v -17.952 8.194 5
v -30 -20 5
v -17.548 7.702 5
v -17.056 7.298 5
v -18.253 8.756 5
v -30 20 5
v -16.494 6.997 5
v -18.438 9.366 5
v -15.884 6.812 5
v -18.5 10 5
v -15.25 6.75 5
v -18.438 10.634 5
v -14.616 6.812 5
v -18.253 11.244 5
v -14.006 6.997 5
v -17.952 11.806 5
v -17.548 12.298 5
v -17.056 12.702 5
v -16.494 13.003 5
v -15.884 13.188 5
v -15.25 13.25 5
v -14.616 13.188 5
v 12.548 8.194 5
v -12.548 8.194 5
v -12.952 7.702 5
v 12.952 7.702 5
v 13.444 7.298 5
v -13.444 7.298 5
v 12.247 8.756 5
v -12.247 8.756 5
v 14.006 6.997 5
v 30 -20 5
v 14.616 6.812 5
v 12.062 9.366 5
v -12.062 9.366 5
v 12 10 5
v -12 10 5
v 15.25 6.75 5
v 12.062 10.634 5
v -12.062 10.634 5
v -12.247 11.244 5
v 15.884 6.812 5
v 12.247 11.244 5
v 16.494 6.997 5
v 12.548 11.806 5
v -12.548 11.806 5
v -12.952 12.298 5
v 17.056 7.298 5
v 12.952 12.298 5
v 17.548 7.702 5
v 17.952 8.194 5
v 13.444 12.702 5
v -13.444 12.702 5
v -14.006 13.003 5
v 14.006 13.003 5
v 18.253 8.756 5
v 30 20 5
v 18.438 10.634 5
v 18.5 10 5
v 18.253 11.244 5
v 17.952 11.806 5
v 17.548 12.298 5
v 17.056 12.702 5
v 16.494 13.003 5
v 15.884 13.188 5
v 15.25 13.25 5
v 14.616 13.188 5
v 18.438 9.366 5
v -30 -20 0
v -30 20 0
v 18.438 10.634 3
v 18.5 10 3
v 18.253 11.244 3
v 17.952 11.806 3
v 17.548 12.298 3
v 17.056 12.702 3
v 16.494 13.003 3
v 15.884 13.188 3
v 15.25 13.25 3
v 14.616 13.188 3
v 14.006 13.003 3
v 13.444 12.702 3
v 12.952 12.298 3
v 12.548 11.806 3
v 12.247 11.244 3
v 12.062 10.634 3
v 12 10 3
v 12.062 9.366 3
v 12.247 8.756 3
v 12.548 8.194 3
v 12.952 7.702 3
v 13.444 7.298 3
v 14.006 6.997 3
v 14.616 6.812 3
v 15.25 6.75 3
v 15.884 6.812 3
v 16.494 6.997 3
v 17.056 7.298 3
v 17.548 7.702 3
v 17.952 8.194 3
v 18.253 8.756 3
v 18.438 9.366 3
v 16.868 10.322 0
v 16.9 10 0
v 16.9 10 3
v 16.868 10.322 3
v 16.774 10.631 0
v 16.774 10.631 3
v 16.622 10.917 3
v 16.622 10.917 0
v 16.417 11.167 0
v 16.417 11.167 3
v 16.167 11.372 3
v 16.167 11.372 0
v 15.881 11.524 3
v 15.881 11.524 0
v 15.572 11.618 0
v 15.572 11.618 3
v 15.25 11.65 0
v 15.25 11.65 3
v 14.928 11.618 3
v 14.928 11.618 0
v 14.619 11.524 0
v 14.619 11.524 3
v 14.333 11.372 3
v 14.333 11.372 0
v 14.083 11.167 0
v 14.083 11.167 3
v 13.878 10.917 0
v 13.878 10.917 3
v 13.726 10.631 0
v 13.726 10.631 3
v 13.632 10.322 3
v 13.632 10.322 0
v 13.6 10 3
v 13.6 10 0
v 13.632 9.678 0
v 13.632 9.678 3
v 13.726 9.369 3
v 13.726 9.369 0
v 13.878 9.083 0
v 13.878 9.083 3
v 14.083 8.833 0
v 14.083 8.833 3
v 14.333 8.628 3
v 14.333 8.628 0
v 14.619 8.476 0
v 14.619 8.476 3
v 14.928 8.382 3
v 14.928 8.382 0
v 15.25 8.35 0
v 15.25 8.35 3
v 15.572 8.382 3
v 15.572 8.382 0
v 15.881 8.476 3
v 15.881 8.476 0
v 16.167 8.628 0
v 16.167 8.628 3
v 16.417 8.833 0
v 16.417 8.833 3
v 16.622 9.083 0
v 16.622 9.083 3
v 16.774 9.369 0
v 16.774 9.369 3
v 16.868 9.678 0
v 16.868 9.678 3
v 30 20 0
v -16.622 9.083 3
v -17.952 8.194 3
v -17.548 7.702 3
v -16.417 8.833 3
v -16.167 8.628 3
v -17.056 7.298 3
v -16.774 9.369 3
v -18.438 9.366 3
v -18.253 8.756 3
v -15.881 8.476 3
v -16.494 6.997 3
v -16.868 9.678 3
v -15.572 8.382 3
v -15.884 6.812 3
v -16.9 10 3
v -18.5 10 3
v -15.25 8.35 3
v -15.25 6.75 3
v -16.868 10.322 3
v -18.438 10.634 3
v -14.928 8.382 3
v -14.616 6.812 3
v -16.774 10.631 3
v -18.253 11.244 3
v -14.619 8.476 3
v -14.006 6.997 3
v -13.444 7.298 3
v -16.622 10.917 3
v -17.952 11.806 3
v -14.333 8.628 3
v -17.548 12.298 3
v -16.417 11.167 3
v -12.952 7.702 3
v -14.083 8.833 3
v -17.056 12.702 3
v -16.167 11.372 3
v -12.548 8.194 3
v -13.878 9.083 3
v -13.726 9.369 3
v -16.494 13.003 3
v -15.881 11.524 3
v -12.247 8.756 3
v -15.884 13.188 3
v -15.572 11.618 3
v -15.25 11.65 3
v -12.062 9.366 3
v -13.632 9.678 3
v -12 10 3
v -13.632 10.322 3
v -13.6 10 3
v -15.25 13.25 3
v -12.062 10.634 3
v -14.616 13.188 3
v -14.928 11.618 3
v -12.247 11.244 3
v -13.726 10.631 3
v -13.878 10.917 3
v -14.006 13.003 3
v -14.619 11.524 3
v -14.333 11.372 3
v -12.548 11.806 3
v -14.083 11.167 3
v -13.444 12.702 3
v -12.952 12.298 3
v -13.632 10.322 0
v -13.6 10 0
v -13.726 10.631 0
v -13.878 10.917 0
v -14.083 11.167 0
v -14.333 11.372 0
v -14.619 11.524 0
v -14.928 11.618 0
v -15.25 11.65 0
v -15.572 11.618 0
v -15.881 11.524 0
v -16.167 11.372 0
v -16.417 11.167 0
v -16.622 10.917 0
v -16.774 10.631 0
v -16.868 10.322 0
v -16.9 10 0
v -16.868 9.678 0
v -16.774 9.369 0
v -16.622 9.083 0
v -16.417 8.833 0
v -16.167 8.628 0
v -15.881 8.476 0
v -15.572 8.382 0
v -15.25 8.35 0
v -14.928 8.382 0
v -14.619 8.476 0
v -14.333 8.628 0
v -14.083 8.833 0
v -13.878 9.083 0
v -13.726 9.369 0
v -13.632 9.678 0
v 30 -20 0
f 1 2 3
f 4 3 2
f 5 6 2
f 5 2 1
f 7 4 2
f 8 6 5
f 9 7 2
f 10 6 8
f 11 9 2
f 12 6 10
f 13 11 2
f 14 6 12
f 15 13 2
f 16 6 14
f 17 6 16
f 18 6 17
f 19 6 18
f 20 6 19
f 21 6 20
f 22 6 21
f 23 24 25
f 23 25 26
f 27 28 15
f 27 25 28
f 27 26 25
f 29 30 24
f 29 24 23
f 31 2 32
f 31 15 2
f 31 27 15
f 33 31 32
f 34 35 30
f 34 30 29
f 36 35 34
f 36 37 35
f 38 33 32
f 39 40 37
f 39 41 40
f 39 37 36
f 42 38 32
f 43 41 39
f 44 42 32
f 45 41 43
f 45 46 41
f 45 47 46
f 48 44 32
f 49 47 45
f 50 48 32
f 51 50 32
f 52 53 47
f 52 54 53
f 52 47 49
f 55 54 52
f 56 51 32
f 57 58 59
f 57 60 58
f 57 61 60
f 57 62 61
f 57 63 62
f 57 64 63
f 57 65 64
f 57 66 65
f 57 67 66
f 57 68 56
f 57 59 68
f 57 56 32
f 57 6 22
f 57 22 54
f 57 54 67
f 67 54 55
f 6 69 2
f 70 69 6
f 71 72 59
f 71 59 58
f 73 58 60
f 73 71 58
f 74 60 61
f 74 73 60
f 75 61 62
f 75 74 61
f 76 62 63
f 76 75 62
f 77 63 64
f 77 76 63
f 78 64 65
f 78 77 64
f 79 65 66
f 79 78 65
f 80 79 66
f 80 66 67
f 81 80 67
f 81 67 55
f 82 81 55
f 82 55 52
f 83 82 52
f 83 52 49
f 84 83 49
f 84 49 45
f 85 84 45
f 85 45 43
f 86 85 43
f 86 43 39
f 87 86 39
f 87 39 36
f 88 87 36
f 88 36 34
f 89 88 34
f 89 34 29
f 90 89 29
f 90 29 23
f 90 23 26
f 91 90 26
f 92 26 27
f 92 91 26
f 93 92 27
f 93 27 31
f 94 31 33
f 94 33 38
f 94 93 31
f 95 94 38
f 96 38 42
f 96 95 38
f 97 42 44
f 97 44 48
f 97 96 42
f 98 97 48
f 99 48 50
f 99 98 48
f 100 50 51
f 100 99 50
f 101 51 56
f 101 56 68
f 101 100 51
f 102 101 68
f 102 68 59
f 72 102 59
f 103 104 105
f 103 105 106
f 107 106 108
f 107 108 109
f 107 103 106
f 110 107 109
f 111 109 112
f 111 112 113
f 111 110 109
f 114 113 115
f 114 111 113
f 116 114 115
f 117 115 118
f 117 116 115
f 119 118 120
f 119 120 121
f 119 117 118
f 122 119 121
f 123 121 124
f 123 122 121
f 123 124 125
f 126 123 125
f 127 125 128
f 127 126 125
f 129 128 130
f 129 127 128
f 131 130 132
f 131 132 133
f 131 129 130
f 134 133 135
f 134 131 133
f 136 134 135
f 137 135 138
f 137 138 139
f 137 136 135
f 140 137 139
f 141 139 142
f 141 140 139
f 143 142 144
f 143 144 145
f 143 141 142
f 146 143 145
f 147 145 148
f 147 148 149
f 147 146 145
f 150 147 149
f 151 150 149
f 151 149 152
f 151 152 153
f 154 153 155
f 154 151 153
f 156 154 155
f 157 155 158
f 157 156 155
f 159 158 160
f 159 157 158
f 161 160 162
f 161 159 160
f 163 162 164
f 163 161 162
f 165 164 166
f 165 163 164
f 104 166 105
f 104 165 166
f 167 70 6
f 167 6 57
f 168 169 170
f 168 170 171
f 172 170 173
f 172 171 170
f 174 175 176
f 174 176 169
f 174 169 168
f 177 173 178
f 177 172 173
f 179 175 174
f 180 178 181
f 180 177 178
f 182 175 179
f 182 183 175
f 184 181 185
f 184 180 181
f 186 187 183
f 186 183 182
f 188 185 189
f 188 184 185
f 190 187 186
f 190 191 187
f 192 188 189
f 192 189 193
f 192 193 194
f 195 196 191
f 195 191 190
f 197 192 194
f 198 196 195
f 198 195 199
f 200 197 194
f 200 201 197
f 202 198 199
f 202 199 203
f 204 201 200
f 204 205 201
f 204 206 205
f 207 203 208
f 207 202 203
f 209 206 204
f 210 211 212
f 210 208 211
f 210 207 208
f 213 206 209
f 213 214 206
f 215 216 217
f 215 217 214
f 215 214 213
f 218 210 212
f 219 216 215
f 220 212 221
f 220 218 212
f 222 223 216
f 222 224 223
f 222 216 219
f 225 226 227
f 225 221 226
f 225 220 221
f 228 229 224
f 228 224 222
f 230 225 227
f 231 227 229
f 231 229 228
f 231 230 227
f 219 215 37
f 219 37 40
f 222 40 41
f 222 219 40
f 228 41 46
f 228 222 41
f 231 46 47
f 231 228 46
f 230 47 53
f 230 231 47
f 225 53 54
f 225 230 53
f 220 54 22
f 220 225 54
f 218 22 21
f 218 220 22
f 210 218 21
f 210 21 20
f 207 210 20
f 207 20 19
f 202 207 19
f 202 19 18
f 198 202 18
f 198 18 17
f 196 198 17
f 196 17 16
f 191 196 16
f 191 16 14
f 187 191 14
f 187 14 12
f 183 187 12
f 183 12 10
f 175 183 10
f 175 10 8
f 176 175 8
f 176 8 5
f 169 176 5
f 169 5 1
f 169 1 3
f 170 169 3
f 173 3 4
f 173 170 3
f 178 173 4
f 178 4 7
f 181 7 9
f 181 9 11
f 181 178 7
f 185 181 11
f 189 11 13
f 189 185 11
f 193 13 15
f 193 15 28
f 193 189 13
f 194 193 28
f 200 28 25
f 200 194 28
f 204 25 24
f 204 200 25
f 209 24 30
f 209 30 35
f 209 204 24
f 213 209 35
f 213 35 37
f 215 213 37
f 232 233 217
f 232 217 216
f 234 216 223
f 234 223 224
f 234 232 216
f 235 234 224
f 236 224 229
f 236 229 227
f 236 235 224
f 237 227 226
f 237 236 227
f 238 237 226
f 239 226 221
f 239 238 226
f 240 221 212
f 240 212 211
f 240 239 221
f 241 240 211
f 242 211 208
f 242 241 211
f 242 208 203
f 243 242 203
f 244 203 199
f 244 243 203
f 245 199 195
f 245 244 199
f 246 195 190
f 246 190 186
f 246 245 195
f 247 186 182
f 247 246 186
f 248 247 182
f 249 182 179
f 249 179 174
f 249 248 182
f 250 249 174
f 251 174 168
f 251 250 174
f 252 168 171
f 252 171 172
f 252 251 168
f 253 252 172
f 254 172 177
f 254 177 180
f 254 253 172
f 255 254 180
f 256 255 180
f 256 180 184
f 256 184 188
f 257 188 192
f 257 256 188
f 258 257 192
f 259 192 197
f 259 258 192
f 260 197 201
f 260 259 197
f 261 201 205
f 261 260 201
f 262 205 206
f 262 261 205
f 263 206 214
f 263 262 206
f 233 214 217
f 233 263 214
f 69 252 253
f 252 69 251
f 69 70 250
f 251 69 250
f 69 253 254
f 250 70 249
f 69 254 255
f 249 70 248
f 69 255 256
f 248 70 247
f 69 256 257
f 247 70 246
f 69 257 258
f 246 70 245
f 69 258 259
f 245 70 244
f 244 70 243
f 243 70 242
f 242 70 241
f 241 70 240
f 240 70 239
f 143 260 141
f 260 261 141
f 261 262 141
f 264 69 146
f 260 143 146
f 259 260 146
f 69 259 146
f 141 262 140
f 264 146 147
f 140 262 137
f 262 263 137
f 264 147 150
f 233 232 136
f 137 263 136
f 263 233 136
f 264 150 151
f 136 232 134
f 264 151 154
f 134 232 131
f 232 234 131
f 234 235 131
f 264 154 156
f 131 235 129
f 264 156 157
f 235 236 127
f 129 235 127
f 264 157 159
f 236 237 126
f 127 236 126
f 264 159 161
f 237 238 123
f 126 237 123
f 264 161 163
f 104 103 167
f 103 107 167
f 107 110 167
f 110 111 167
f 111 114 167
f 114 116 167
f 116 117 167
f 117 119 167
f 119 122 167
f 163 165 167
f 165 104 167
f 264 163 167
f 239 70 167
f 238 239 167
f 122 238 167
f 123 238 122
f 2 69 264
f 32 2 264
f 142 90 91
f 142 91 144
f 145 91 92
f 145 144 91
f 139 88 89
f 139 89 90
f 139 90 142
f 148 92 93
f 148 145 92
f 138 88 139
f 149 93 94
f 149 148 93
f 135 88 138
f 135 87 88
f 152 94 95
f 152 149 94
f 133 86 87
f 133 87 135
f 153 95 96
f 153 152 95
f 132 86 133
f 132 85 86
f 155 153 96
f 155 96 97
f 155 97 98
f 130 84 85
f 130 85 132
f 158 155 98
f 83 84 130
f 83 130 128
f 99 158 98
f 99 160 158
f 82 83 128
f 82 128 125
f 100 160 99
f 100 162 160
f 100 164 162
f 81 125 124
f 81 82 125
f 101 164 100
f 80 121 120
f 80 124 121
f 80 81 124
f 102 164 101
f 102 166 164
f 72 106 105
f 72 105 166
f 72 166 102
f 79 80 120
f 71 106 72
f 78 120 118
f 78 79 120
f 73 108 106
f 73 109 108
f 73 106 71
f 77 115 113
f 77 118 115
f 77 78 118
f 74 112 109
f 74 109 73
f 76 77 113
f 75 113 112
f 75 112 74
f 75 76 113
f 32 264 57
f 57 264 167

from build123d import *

# Parameters (mm, degrees)
F0_W     = 60
F0_H     = 40
F0_R     = 3.25
F1_DEPTH = 5
F0_R_2   = 1.65
F2_DEPTH = 3


with BuildPart() as f1:
    # F0 (on Top) → F1 (new body)
    with BuildSketch(Plane.XY):
        Rectangle(F0_W, F0_H)
        with Locations((-15.25, 10)):
            Circle(F0_R, mode=Mode.SUBTRACT)
        with Locations((15.25, 10)):
            Circle(F0_R, mode=Mode.SUBTRACT)
    extrude(amount=F1_DEPTH)

    # F0 (on Top) → F2 (join)
    with BuildSketch(Plane.XY):
        with Locations((15.25, 10)):
            Circle(F0_R)
        with Locations((15.25, 10)):
            Circle(F0_R_2, mode=Mode.SUBTRACT)
        with Locations((-15.25, 10)):
            Circle(F0_R)
        with Locations((-15.25, 10)):
            Circle(F0_R_2, mode=Mode.SUBTRACT)
    extrude(amount=F2_DEPTH)


solid = f1.part
